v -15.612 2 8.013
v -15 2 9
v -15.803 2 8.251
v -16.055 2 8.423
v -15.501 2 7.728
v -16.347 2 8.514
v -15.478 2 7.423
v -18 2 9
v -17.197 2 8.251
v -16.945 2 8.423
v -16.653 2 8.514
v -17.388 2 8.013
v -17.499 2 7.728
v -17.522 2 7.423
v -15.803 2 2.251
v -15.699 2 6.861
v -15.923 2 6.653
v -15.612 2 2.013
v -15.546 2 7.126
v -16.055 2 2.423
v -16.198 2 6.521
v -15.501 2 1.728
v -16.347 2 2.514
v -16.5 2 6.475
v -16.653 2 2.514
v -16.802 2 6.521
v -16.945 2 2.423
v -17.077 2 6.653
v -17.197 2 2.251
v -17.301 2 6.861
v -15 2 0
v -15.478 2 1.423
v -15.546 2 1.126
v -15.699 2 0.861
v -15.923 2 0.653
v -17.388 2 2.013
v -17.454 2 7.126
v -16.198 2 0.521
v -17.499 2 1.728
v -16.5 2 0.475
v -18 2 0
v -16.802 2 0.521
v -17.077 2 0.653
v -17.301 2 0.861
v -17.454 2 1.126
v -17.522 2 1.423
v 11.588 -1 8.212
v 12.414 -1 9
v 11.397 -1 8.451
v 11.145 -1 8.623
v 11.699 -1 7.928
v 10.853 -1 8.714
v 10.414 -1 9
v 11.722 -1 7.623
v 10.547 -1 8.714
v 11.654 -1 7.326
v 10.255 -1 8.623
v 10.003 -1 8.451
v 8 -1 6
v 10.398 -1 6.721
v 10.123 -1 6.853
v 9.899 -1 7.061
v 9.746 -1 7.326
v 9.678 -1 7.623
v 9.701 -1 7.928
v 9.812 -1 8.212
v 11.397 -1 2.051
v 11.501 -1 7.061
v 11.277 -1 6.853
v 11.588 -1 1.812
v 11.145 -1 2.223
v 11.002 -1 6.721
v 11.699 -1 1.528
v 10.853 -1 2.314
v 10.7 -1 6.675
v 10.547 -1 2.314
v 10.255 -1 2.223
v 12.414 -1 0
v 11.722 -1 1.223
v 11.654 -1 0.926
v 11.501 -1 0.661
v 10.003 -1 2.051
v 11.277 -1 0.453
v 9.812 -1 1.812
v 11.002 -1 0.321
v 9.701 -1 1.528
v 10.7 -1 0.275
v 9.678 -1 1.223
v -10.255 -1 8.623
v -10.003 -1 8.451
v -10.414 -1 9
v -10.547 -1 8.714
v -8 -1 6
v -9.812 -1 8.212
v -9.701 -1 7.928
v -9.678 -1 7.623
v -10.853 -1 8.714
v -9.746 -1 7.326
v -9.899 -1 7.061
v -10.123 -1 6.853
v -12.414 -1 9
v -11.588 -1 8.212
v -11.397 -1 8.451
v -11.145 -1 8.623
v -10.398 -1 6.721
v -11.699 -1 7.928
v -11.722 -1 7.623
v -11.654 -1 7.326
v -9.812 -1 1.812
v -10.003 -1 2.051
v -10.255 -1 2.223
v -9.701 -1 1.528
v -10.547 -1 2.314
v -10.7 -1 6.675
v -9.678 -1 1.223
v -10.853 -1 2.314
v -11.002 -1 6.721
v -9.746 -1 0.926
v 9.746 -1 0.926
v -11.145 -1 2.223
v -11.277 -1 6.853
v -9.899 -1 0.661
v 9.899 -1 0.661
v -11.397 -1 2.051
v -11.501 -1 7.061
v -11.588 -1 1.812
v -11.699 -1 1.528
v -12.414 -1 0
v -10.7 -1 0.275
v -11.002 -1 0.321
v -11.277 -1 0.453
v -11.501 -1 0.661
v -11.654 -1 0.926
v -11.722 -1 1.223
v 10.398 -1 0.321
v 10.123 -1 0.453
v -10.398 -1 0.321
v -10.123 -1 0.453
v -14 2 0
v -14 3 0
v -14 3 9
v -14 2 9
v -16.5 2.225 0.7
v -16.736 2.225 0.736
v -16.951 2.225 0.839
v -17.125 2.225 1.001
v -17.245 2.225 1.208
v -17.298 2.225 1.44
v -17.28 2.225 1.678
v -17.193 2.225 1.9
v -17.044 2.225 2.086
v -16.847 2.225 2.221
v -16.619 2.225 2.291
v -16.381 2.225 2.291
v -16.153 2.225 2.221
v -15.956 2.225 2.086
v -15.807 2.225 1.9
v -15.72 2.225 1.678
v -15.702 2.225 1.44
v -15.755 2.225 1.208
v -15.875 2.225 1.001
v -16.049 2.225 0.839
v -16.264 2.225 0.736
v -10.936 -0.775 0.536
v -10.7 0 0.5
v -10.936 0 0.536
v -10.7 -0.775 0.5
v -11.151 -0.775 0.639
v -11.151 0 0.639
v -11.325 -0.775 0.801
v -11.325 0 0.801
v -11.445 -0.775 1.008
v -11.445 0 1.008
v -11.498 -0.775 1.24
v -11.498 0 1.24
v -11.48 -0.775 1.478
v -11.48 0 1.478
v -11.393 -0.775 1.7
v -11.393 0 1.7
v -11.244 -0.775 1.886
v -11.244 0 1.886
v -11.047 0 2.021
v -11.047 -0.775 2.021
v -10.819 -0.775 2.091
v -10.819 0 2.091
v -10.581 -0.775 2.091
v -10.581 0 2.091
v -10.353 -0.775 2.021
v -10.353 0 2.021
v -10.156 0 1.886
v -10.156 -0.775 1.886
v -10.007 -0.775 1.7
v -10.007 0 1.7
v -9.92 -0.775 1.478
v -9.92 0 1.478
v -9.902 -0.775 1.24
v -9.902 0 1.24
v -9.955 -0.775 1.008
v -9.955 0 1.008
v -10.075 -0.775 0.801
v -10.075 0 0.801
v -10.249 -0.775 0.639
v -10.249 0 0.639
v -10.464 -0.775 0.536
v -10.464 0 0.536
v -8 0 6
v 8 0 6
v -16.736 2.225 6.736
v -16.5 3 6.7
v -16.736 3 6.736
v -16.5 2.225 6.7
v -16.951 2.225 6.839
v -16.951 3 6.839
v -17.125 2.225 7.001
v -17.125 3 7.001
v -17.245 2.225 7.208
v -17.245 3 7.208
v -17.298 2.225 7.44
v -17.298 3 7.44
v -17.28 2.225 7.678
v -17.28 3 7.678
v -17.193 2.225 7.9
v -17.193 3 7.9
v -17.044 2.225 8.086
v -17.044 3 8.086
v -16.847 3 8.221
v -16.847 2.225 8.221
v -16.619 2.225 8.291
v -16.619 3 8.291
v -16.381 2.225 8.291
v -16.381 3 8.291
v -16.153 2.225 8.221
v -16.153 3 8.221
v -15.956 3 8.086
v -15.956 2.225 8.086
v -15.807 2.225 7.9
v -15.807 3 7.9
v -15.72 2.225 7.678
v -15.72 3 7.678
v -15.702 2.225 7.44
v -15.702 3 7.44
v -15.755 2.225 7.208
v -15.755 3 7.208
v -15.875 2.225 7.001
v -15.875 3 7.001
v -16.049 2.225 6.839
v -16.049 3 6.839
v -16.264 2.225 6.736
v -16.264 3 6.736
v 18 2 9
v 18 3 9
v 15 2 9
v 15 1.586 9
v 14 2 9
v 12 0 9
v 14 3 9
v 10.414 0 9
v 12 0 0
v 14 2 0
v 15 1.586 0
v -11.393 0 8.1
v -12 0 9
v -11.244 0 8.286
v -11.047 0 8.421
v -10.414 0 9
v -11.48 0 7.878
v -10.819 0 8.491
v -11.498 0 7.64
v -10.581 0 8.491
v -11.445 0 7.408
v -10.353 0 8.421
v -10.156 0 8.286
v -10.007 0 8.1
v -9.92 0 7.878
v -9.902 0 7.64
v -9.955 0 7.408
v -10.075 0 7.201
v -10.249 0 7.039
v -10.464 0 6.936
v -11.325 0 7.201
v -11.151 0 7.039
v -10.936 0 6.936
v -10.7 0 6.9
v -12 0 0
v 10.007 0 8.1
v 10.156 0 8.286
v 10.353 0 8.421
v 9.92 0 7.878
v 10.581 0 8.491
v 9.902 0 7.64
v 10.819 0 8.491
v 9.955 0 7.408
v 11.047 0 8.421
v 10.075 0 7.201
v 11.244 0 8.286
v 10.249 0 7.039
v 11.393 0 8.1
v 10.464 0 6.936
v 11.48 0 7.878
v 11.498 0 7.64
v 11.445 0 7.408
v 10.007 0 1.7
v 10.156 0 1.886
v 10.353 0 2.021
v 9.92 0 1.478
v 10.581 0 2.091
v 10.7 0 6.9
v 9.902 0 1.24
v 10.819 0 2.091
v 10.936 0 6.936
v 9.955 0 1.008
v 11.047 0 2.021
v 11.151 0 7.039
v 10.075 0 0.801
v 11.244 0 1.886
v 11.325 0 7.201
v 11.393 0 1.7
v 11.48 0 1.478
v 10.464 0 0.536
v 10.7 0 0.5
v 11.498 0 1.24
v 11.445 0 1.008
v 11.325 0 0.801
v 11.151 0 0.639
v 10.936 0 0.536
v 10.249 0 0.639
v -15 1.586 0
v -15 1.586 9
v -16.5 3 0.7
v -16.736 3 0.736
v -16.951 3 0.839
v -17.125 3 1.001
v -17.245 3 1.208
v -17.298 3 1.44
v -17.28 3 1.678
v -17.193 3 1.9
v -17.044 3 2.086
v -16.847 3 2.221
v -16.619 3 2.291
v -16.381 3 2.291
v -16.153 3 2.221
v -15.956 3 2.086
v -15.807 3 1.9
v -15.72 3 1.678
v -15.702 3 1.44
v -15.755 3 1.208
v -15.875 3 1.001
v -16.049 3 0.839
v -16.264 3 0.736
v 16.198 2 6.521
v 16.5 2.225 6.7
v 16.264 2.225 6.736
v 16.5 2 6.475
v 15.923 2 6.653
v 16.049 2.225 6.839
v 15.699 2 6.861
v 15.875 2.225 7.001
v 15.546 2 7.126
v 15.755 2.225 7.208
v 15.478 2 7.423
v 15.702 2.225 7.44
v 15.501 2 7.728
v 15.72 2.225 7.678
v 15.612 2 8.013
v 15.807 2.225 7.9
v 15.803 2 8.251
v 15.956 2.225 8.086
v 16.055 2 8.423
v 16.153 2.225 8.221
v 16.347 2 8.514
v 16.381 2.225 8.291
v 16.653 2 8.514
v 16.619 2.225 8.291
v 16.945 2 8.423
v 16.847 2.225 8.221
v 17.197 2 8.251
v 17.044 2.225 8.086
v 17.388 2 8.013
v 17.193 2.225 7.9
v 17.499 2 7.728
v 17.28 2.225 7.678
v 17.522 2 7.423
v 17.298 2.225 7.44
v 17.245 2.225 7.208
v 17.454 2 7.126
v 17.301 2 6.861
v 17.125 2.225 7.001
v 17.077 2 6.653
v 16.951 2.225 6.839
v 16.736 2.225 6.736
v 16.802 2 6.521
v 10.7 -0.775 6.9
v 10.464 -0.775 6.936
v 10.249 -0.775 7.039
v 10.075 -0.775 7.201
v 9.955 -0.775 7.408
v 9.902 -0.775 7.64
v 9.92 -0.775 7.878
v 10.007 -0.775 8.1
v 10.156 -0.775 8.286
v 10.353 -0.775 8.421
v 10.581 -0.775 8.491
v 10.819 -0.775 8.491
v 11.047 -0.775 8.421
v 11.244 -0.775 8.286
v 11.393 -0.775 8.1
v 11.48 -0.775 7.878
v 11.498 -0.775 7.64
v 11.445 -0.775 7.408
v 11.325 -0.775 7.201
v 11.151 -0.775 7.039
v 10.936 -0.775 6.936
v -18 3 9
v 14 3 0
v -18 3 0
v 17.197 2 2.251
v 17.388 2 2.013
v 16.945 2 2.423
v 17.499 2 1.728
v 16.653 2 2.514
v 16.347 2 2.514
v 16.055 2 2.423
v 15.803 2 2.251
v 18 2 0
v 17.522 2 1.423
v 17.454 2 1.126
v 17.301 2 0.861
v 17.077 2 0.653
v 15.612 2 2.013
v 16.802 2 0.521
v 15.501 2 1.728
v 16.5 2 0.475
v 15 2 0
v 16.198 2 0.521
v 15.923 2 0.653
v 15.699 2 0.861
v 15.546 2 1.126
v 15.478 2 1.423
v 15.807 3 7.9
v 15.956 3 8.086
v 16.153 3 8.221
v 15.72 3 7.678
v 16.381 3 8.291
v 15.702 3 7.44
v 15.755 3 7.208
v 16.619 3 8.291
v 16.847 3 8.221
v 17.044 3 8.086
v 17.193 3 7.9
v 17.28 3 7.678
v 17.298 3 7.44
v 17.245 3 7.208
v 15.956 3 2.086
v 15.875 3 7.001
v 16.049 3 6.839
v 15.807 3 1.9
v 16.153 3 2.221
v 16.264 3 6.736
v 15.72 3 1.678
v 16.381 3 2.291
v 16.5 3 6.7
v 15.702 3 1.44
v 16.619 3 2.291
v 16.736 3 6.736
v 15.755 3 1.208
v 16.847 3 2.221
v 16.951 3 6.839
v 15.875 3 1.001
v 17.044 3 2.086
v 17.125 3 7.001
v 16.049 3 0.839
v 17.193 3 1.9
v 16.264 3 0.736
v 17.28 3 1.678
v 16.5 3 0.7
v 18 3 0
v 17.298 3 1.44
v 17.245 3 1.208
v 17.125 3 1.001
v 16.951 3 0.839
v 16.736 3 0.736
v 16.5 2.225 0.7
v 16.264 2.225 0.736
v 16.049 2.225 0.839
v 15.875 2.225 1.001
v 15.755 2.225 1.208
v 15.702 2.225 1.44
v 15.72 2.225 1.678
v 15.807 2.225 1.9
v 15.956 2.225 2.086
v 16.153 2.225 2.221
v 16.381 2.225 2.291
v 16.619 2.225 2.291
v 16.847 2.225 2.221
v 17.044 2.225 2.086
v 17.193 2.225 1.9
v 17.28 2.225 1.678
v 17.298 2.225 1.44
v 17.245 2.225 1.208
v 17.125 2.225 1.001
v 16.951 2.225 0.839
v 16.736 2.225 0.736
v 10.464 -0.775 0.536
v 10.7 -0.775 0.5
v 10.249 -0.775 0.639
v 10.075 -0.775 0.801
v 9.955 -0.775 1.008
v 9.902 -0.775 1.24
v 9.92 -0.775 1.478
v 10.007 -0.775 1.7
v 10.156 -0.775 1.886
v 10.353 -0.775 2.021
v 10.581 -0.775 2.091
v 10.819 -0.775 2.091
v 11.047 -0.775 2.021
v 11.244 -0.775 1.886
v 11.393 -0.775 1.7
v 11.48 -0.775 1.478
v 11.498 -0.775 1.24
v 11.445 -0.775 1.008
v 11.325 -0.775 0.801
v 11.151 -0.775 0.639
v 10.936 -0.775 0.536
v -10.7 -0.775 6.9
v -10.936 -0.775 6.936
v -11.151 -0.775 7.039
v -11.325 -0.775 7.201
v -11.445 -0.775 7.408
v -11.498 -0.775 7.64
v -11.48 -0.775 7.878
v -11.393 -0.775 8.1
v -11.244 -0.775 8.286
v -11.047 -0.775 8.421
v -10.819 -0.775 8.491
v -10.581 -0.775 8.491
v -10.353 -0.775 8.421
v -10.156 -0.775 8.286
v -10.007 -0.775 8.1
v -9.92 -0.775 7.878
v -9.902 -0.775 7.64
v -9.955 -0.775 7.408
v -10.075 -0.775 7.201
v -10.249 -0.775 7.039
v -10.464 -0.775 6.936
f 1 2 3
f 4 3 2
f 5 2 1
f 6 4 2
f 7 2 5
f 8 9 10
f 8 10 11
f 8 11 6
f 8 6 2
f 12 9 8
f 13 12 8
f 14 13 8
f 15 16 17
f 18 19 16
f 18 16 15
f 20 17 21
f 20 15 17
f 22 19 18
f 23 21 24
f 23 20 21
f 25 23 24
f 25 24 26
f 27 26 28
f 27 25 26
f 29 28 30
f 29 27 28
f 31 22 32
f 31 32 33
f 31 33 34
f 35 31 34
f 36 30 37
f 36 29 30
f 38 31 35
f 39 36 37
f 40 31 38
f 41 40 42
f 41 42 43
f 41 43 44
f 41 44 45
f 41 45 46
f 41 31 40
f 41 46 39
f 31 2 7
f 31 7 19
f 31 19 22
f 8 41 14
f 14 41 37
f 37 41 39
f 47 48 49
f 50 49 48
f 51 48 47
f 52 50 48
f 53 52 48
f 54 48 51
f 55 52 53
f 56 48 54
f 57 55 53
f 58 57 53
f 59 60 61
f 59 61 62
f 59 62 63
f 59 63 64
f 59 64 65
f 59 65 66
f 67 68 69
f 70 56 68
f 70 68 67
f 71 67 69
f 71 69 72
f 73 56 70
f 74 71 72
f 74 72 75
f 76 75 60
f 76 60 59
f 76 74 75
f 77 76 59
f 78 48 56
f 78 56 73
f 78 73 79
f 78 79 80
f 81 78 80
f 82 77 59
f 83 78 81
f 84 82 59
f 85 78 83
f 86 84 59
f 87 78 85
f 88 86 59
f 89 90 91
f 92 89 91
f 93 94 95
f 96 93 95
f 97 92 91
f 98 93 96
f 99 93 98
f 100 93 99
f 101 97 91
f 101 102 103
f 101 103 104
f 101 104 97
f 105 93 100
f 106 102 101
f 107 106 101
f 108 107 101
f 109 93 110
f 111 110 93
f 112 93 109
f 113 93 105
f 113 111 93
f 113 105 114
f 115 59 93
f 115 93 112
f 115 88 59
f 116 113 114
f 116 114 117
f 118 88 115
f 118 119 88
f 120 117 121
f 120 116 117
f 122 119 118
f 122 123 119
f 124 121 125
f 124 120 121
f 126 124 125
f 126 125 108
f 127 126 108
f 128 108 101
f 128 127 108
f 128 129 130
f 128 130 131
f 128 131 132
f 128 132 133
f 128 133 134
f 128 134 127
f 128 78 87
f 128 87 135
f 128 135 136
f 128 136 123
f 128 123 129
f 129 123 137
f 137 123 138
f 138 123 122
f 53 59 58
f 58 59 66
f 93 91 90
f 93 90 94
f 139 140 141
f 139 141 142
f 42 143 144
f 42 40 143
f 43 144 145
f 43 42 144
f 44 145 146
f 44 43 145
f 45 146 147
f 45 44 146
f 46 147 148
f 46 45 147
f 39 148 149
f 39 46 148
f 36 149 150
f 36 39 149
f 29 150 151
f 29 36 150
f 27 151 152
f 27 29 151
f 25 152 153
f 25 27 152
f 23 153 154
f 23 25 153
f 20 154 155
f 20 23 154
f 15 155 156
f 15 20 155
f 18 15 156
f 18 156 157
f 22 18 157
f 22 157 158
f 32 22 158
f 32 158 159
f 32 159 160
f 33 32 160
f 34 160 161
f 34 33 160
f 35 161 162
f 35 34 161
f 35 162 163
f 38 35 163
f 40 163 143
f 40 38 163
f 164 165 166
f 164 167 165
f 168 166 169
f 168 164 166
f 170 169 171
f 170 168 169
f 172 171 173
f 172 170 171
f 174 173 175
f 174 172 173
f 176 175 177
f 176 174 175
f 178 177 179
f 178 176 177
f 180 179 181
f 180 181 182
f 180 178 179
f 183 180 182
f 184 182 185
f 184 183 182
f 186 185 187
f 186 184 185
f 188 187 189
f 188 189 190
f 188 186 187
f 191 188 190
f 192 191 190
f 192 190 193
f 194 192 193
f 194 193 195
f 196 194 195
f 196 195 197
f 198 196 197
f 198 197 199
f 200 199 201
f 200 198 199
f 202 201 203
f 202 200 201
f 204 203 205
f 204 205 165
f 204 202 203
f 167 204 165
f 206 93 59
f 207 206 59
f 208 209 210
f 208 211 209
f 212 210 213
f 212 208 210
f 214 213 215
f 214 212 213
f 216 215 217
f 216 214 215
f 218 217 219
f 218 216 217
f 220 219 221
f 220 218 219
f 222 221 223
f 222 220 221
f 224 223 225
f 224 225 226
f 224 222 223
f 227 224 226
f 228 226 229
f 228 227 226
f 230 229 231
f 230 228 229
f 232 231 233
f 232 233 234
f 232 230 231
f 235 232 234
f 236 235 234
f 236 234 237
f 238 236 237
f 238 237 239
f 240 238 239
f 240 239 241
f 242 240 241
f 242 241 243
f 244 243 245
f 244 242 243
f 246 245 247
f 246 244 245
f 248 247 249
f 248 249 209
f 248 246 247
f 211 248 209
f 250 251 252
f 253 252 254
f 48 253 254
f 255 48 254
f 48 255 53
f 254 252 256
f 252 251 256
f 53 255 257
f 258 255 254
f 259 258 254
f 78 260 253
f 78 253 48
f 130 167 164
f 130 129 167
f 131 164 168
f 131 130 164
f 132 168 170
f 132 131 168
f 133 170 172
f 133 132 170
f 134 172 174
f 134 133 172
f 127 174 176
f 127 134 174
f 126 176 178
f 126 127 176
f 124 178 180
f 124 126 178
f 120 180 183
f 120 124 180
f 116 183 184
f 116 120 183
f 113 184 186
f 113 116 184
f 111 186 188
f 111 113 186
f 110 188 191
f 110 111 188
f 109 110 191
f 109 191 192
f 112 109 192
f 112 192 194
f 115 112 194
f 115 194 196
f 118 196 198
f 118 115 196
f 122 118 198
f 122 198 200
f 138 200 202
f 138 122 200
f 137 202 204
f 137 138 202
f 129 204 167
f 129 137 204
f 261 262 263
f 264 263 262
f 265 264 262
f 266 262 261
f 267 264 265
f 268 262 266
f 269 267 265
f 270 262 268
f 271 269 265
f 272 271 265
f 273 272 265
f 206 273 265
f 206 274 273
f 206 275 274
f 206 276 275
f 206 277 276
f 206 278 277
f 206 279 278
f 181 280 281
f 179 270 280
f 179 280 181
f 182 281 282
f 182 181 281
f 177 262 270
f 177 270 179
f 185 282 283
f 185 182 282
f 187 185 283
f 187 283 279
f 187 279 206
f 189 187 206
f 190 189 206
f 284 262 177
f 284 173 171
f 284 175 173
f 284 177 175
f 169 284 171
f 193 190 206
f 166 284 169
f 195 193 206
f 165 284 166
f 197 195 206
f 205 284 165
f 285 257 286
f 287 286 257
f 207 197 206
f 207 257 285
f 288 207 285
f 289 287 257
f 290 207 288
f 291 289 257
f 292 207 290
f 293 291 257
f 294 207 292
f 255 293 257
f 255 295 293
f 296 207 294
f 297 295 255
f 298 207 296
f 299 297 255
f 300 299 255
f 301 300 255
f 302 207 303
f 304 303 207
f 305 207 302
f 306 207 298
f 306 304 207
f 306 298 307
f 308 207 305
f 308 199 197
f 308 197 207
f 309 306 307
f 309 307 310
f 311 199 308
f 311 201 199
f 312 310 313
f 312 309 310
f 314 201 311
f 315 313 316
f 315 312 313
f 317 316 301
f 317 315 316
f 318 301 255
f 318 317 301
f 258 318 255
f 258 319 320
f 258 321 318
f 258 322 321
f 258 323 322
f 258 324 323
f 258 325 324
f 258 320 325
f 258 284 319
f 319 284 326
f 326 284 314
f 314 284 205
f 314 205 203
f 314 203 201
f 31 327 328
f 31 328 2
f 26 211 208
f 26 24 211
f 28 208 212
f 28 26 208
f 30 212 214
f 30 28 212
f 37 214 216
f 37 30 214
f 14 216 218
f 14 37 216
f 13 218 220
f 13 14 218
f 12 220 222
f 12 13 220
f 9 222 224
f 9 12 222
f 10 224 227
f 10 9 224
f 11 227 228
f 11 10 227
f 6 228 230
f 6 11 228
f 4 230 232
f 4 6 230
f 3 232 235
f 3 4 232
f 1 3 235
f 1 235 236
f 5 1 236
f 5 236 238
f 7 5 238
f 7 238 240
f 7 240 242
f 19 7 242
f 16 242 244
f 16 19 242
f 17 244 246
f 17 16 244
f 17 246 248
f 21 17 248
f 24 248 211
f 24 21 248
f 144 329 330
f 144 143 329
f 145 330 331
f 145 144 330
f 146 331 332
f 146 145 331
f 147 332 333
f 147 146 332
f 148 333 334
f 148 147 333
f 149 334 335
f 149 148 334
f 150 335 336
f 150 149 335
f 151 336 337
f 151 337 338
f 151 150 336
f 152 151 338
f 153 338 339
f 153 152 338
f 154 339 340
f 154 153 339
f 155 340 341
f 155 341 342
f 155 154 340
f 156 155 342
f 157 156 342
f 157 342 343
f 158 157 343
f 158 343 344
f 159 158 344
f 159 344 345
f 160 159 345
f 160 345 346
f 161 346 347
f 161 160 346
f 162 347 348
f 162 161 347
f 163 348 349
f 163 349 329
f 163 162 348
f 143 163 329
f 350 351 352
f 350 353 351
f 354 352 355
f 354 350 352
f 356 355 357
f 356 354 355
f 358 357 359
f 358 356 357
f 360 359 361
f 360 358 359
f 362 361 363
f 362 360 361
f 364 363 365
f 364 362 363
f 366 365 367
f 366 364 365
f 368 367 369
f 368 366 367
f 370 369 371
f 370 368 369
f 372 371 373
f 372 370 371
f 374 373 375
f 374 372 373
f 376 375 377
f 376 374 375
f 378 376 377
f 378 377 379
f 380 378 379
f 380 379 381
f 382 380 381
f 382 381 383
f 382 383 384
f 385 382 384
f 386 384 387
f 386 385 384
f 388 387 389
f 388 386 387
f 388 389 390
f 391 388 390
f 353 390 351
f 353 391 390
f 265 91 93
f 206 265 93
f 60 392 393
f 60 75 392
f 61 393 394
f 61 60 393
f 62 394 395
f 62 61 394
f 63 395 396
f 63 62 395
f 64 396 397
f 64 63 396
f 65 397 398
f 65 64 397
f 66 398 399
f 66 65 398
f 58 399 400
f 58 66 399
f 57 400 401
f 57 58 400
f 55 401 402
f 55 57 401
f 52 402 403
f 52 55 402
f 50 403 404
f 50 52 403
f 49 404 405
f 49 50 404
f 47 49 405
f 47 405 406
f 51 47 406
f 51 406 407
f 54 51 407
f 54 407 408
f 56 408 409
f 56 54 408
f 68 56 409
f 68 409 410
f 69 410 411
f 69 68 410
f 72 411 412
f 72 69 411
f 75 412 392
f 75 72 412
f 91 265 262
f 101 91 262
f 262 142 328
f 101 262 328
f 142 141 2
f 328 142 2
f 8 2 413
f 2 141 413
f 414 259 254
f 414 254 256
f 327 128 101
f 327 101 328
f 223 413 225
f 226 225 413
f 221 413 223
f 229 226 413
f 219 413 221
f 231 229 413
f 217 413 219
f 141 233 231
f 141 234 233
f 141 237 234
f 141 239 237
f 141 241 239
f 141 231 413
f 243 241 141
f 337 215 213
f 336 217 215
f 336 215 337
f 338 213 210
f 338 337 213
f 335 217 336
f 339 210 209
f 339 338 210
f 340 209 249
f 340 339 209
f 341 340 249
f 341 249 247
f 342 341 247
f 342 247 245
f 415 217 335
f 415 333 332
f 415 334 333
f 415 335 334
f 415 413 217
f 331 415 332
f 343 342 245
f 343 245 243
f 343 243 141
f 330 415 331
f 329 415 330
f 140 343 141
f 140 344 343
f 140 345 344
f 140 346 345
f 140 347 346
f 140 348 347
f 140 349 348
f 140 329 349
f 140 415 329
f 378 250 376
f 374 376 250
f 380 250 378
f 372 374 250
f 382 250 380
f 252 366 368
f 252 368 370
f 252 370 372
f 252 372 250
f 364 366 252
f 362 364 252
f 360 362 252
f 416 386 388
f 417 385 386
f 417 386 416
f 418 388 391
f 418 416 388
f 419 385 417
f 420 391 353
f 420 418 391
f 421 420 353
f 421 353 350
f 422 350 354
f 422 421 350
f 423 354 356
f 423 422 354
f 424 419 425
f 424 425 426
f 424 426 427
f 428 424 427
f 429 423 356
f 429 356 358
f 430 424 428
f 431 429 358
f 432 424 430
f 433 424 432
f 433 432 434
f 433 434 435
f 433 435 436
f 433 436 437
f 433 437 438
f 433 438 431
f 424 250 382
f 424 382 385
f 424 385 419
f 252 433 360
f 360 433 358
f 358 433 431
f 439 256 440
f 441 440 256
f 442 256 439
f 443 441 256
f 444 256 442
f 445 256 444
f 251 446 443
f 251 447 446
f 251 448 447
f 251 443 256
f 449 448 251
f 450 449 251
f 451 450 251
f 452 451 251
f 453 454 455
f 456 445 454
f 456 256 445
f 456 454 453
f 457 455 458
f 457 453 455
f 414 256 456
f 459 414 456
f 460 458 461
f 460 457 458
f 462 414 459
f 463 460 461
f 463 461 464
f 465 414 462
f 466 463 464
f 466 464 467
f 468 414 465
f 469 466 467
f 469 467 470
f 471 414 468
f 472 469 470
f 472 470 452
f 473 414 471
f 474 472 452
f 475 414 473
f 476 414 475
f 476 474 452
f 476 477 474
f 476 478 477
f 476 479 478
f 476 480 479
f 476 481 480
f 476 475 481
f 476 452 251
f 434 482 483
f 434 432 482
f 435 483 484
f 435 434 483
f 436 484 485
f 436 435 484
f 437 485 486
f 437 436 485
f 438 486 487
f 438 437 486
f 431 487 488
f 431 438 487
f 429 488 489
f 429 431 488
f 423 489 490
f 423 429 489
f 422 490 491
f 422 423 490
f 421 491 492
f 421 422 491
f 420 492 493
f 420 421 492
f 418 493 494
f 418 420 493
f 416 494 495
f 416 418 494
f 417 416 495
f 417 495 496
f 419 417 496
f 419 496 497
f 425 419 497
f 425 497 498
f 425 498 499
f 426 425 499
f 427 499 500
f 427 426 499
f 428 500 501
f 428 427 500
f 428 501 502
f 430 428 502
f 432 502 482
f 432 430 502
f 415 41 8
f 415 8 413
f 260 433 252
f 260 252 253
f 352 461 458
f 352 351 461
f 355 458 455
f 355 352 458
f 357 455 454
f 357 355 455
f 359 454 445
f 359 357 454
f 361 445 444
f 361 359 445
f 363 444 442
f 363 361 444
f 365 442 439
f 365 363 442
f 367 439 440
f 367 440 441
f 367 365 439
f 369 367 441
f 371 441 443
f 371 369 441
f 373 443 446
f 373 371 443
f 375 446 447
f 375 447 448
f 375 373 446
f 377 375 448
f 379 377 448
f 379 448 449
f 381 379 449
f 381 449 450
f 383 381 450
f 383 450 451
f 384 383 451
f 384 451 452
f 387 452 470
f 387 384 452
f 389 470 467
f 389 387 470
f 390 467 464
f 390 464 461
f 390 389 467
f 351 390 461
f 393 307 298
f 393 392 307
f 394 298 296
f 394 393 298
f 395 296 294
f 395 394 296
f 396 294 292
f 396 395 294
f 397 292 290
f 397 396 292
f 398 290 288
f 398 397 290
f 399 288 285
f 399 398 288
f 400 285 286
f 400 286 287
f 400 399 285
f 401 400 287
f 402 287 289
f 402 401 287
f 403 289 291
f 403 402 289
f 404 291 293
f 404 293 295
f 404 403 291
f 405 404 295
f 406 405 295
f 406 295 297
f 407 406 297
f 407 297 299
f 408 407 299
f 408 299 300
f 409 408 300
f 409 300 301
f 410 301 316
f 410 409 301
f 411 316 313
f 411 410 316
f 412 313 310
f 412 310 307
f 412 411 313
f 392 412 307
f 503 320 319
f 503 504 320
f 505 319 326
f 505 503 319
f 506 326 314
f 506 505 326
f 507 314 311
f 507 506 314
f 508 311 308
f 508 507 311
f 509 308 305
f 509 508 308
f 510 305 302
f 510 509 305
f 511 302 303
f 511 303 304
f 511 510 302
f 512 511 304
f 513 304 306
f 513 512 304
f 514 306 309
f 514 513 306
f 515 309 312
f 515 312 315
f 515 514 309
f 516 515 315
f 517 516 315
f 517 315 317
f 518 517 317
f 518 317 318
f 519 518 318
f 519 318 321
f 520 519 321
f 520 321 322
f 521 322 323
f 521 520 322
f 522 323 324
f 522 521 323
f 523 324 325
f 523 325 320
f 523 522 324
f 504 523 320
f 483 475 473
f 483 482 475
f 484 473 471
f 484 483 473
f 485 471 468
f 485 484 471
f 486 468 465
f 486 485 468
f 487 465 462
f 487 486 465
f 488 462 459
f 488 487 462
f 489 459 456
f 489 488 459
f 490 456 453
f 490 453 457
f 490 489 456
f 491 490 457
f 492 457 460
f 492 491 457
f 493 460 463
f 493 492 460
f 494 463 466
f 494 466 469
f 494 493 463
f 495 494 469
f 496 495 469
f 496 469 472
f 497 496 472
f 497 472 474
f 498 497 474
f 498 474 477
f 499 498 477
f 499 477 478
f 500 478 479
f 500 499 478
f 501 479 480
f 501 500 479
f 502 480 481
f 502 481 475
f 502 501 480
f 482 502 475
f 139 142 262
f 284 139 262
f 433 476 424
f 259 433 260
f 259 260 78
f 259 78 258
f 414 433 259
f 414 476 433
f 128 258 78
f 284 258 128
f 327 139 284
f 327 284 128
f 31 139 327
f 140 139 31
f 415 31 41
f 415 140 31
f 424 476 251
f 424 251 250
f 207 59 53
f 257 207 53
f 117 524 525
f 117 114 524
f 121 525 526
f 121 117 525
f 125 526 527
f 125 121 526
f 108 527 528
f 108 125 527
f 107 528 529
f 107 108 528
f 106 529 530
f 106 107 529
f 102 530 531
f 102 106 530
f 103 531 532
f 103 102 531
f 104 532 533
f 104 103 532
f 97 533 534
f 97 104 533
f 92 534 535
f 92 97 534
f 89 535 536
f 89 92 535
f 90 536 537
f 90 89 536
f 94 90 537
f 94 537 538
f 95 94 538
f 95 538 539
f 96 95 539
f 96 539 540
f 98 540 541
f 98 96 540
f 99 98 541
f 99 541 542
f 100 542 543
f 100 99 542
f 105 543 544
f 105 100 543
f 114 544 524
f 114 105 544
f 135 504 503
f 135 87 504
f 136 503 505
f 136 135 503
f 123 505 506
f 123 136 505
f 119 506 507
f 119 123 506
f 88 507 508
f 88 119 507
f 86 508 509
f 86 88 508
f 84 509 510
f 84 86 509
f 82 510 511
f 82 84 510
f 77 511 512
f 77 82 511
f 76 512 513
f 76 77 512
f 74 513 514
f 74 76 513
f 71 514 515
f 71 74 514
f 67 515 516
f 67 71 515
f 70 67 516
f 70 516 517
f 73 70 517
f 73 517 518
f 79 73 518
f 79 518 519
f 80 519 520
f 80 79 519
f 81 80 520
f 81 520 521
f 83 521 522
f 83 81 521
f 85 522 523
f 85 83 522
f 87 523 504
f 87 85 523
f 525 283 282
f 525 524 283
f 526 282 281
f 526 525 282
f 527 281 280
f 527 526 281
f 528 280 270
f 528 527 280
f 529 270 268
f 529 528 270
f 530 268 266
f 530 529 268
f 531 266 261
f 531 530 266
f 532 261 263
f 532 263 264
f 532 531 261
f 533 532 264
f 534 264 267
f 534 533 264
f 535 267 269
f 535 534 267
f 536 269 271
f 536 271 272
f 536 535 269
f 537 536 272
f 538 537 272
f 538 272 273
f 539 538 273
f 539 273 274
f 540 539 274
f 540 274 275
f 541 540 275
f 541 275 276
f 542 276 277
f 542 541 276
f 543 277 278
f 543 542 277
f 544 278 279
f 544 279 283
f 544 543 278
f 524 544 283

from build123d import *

# Parameters (mm, degrees)
EXTRUDE_1_DEPTH             = 9
CUT_EXTRUDE_1_DEPTH         = 21.518284529
HOLE_WIZARD_M2_2_AT_2_COUNT = 2
HOLE_WIZARD_M2_2_AT_2_PITCH = 6
HOLE_WIZARD_M2_2_AT_3_COUNT = 2
HOLE_WIZARD_M2_2_AT_3_PITCH = 33
HOLE_WIZARD_M2_2_AT_4_COUNT = 2
HOLE_WIZARD_M2_2_AT_4_PITCH = 33.541019662
HOLE_WIZARD_M2_3_AT_2_COUNT = 2
HOLE_WIZARD_M2_3_AT_2_PITCH = 6.4
HOLE_WIZARD_M2_3_AT_3_COUNT = 2
HOLE_WIZARD_M2_3_AT_3_PITCH = 22.336517186
HOLE_WIZARD_M2_3_AT_4_COUNT = 2
HOLE_WIZARD_M2_3_AT_4_PITCH = 21.4


with BuildPart() as part:
    # 草图1 → 凸台-拉伸1 (new body)
    with BuildSketch(Plane.XY):
        Polygon((-12, 0), (12, 0), (14, 2), (14, 3), (18, 3), (18, 2), (15, 2), (15, 1.585786438), (12.414213562, -1), (-12.414213562, -1), (-15, 1.585786438), (-15, 2), (-18, 2), (-18, 3), (-14, 3), (-14, 2), align=None)
    extrude(amount=EXTRUDE_1_DEPTH)

    # 草图2 → 切除-拉伸1 (cut, through all)
    with BuildSketch(Plane.XZ.offset(1)):
        Polygon((-10.414213562, 9), (-8, 6), (8, 6), (10.414213562, 9), align=None)
    extrude(amount=-CUT_EXTRUDE_1_DEPTH, mode=Mode.SUBTRACT)

    # 草图7 → M2 螺纹孔2 (revolve, cut)
    with BuildSketch(Plane(origin=(-16.5, 2, 7.5), x_dir=(0, 0, -1), z_dir=(1, 0, 0))):
        Polygon((0, 0), (0, 1), (0.8, 1), (0.8, 0.225), (1.025, 0), align=None)
    hole_wizard_m2_2 = revolve(axis=Axis((-16.5, -4.35, 7.5), (0, 1, 0)), mode=Mode.SUBTRACT)

    # M2 螺纹孔2 at 2: M2 螺纹孔2 ×2
    with Locations(*[(0, 0, -i * HOLE_WIZARD_M2_2_AT_2_PITCH) for i in range(1, HOLE_WIZARD_M2_2_AT_2_COUNT)]):
        add(hole_wizard_m2_2, mode=Mode.SUBTRACT)

    # M2 螺纹孔2 at 3: M2 螺纹孔2 ×2
    with Locations(*[(i * HOLE_WIZARD_M2_2_AT_3_PITCH, 0, 0) for i in range(1, HOLE_WIZARD_M2_2_AT_3_COUNT)]):
        add(hole_wizard_m2_2, mode=Mode.SUBTRACT)

    # M2 螺纹孔2 at 4: M2 螺纹孔2 ×2
    with Locations(*[Vector(0.9838699100999075, 0, -0.17888543819998318) * (i * HOLE_WIZARD_M2_2_AT_4_PITCH) for i in range(1, HOLE_WIZARD_M2_2_AT_4_COUNT)]):
        add(hole_wizard_m2_2, mode=Mode.SUBTRACT)

    # 草图10 → M2 螺纹孔3 (revolve, cut)
    with BuildSketch(Plane(origin=(-10.7, -1, 7.7), x_dir=(0, 0, -1), z_dir=(1, 0, 0))):
        Polygon((0, 0), (0, 1), (0.8, 1), (0.8, 0.225), (1.025, 0), align=None)
    hole_wizard_m2_3 = revolve(axis=Axis((-10.7, -7.35, 7.7), (0, 1, 0)), mode=Mode.SUBTRACT)

    # M2 螺纹孔3 at 2: M2 螺纹孔3 ×2
    with Locations(*[(0, 0, -i * HOLE_WIZARD_M2_3_AT_2_PITCH) for i in range(1, HOLE_WIZARD_M2_3_AT_2_COUNT)]):
        add(hole_wizard_m2_3, mode=Mode.SUBTRACT)

    # M2 螺纹孔3 at 3: M2 螺纹孔3 ×2
    with Locations(*[Vector(0.9580723718836152, 0, -0.28652631682500634) * (i * HOLE_WIZARD_M2_3_AT_3_PITCH) for i in range(1, HOLE_WIZARD_M2_3_AT_3_COUNT)]):
        add(hole_wizard_m2_3, mode=Mode.SUBTRACT)

    # M2 螺纹孔3 at 4: M2 螺纹孔3 ×2
    with Locations(*[(i * HOLE_WIZARD_M2_3_AT_4_PITCH, 0, 0) for i in range(1, HOLE_WIZARD_M2_3_AT_4_COUNT)]):
        add(hole_wizard_m2_3, mode=Mode.SUBTRACT)


solid = part.part
